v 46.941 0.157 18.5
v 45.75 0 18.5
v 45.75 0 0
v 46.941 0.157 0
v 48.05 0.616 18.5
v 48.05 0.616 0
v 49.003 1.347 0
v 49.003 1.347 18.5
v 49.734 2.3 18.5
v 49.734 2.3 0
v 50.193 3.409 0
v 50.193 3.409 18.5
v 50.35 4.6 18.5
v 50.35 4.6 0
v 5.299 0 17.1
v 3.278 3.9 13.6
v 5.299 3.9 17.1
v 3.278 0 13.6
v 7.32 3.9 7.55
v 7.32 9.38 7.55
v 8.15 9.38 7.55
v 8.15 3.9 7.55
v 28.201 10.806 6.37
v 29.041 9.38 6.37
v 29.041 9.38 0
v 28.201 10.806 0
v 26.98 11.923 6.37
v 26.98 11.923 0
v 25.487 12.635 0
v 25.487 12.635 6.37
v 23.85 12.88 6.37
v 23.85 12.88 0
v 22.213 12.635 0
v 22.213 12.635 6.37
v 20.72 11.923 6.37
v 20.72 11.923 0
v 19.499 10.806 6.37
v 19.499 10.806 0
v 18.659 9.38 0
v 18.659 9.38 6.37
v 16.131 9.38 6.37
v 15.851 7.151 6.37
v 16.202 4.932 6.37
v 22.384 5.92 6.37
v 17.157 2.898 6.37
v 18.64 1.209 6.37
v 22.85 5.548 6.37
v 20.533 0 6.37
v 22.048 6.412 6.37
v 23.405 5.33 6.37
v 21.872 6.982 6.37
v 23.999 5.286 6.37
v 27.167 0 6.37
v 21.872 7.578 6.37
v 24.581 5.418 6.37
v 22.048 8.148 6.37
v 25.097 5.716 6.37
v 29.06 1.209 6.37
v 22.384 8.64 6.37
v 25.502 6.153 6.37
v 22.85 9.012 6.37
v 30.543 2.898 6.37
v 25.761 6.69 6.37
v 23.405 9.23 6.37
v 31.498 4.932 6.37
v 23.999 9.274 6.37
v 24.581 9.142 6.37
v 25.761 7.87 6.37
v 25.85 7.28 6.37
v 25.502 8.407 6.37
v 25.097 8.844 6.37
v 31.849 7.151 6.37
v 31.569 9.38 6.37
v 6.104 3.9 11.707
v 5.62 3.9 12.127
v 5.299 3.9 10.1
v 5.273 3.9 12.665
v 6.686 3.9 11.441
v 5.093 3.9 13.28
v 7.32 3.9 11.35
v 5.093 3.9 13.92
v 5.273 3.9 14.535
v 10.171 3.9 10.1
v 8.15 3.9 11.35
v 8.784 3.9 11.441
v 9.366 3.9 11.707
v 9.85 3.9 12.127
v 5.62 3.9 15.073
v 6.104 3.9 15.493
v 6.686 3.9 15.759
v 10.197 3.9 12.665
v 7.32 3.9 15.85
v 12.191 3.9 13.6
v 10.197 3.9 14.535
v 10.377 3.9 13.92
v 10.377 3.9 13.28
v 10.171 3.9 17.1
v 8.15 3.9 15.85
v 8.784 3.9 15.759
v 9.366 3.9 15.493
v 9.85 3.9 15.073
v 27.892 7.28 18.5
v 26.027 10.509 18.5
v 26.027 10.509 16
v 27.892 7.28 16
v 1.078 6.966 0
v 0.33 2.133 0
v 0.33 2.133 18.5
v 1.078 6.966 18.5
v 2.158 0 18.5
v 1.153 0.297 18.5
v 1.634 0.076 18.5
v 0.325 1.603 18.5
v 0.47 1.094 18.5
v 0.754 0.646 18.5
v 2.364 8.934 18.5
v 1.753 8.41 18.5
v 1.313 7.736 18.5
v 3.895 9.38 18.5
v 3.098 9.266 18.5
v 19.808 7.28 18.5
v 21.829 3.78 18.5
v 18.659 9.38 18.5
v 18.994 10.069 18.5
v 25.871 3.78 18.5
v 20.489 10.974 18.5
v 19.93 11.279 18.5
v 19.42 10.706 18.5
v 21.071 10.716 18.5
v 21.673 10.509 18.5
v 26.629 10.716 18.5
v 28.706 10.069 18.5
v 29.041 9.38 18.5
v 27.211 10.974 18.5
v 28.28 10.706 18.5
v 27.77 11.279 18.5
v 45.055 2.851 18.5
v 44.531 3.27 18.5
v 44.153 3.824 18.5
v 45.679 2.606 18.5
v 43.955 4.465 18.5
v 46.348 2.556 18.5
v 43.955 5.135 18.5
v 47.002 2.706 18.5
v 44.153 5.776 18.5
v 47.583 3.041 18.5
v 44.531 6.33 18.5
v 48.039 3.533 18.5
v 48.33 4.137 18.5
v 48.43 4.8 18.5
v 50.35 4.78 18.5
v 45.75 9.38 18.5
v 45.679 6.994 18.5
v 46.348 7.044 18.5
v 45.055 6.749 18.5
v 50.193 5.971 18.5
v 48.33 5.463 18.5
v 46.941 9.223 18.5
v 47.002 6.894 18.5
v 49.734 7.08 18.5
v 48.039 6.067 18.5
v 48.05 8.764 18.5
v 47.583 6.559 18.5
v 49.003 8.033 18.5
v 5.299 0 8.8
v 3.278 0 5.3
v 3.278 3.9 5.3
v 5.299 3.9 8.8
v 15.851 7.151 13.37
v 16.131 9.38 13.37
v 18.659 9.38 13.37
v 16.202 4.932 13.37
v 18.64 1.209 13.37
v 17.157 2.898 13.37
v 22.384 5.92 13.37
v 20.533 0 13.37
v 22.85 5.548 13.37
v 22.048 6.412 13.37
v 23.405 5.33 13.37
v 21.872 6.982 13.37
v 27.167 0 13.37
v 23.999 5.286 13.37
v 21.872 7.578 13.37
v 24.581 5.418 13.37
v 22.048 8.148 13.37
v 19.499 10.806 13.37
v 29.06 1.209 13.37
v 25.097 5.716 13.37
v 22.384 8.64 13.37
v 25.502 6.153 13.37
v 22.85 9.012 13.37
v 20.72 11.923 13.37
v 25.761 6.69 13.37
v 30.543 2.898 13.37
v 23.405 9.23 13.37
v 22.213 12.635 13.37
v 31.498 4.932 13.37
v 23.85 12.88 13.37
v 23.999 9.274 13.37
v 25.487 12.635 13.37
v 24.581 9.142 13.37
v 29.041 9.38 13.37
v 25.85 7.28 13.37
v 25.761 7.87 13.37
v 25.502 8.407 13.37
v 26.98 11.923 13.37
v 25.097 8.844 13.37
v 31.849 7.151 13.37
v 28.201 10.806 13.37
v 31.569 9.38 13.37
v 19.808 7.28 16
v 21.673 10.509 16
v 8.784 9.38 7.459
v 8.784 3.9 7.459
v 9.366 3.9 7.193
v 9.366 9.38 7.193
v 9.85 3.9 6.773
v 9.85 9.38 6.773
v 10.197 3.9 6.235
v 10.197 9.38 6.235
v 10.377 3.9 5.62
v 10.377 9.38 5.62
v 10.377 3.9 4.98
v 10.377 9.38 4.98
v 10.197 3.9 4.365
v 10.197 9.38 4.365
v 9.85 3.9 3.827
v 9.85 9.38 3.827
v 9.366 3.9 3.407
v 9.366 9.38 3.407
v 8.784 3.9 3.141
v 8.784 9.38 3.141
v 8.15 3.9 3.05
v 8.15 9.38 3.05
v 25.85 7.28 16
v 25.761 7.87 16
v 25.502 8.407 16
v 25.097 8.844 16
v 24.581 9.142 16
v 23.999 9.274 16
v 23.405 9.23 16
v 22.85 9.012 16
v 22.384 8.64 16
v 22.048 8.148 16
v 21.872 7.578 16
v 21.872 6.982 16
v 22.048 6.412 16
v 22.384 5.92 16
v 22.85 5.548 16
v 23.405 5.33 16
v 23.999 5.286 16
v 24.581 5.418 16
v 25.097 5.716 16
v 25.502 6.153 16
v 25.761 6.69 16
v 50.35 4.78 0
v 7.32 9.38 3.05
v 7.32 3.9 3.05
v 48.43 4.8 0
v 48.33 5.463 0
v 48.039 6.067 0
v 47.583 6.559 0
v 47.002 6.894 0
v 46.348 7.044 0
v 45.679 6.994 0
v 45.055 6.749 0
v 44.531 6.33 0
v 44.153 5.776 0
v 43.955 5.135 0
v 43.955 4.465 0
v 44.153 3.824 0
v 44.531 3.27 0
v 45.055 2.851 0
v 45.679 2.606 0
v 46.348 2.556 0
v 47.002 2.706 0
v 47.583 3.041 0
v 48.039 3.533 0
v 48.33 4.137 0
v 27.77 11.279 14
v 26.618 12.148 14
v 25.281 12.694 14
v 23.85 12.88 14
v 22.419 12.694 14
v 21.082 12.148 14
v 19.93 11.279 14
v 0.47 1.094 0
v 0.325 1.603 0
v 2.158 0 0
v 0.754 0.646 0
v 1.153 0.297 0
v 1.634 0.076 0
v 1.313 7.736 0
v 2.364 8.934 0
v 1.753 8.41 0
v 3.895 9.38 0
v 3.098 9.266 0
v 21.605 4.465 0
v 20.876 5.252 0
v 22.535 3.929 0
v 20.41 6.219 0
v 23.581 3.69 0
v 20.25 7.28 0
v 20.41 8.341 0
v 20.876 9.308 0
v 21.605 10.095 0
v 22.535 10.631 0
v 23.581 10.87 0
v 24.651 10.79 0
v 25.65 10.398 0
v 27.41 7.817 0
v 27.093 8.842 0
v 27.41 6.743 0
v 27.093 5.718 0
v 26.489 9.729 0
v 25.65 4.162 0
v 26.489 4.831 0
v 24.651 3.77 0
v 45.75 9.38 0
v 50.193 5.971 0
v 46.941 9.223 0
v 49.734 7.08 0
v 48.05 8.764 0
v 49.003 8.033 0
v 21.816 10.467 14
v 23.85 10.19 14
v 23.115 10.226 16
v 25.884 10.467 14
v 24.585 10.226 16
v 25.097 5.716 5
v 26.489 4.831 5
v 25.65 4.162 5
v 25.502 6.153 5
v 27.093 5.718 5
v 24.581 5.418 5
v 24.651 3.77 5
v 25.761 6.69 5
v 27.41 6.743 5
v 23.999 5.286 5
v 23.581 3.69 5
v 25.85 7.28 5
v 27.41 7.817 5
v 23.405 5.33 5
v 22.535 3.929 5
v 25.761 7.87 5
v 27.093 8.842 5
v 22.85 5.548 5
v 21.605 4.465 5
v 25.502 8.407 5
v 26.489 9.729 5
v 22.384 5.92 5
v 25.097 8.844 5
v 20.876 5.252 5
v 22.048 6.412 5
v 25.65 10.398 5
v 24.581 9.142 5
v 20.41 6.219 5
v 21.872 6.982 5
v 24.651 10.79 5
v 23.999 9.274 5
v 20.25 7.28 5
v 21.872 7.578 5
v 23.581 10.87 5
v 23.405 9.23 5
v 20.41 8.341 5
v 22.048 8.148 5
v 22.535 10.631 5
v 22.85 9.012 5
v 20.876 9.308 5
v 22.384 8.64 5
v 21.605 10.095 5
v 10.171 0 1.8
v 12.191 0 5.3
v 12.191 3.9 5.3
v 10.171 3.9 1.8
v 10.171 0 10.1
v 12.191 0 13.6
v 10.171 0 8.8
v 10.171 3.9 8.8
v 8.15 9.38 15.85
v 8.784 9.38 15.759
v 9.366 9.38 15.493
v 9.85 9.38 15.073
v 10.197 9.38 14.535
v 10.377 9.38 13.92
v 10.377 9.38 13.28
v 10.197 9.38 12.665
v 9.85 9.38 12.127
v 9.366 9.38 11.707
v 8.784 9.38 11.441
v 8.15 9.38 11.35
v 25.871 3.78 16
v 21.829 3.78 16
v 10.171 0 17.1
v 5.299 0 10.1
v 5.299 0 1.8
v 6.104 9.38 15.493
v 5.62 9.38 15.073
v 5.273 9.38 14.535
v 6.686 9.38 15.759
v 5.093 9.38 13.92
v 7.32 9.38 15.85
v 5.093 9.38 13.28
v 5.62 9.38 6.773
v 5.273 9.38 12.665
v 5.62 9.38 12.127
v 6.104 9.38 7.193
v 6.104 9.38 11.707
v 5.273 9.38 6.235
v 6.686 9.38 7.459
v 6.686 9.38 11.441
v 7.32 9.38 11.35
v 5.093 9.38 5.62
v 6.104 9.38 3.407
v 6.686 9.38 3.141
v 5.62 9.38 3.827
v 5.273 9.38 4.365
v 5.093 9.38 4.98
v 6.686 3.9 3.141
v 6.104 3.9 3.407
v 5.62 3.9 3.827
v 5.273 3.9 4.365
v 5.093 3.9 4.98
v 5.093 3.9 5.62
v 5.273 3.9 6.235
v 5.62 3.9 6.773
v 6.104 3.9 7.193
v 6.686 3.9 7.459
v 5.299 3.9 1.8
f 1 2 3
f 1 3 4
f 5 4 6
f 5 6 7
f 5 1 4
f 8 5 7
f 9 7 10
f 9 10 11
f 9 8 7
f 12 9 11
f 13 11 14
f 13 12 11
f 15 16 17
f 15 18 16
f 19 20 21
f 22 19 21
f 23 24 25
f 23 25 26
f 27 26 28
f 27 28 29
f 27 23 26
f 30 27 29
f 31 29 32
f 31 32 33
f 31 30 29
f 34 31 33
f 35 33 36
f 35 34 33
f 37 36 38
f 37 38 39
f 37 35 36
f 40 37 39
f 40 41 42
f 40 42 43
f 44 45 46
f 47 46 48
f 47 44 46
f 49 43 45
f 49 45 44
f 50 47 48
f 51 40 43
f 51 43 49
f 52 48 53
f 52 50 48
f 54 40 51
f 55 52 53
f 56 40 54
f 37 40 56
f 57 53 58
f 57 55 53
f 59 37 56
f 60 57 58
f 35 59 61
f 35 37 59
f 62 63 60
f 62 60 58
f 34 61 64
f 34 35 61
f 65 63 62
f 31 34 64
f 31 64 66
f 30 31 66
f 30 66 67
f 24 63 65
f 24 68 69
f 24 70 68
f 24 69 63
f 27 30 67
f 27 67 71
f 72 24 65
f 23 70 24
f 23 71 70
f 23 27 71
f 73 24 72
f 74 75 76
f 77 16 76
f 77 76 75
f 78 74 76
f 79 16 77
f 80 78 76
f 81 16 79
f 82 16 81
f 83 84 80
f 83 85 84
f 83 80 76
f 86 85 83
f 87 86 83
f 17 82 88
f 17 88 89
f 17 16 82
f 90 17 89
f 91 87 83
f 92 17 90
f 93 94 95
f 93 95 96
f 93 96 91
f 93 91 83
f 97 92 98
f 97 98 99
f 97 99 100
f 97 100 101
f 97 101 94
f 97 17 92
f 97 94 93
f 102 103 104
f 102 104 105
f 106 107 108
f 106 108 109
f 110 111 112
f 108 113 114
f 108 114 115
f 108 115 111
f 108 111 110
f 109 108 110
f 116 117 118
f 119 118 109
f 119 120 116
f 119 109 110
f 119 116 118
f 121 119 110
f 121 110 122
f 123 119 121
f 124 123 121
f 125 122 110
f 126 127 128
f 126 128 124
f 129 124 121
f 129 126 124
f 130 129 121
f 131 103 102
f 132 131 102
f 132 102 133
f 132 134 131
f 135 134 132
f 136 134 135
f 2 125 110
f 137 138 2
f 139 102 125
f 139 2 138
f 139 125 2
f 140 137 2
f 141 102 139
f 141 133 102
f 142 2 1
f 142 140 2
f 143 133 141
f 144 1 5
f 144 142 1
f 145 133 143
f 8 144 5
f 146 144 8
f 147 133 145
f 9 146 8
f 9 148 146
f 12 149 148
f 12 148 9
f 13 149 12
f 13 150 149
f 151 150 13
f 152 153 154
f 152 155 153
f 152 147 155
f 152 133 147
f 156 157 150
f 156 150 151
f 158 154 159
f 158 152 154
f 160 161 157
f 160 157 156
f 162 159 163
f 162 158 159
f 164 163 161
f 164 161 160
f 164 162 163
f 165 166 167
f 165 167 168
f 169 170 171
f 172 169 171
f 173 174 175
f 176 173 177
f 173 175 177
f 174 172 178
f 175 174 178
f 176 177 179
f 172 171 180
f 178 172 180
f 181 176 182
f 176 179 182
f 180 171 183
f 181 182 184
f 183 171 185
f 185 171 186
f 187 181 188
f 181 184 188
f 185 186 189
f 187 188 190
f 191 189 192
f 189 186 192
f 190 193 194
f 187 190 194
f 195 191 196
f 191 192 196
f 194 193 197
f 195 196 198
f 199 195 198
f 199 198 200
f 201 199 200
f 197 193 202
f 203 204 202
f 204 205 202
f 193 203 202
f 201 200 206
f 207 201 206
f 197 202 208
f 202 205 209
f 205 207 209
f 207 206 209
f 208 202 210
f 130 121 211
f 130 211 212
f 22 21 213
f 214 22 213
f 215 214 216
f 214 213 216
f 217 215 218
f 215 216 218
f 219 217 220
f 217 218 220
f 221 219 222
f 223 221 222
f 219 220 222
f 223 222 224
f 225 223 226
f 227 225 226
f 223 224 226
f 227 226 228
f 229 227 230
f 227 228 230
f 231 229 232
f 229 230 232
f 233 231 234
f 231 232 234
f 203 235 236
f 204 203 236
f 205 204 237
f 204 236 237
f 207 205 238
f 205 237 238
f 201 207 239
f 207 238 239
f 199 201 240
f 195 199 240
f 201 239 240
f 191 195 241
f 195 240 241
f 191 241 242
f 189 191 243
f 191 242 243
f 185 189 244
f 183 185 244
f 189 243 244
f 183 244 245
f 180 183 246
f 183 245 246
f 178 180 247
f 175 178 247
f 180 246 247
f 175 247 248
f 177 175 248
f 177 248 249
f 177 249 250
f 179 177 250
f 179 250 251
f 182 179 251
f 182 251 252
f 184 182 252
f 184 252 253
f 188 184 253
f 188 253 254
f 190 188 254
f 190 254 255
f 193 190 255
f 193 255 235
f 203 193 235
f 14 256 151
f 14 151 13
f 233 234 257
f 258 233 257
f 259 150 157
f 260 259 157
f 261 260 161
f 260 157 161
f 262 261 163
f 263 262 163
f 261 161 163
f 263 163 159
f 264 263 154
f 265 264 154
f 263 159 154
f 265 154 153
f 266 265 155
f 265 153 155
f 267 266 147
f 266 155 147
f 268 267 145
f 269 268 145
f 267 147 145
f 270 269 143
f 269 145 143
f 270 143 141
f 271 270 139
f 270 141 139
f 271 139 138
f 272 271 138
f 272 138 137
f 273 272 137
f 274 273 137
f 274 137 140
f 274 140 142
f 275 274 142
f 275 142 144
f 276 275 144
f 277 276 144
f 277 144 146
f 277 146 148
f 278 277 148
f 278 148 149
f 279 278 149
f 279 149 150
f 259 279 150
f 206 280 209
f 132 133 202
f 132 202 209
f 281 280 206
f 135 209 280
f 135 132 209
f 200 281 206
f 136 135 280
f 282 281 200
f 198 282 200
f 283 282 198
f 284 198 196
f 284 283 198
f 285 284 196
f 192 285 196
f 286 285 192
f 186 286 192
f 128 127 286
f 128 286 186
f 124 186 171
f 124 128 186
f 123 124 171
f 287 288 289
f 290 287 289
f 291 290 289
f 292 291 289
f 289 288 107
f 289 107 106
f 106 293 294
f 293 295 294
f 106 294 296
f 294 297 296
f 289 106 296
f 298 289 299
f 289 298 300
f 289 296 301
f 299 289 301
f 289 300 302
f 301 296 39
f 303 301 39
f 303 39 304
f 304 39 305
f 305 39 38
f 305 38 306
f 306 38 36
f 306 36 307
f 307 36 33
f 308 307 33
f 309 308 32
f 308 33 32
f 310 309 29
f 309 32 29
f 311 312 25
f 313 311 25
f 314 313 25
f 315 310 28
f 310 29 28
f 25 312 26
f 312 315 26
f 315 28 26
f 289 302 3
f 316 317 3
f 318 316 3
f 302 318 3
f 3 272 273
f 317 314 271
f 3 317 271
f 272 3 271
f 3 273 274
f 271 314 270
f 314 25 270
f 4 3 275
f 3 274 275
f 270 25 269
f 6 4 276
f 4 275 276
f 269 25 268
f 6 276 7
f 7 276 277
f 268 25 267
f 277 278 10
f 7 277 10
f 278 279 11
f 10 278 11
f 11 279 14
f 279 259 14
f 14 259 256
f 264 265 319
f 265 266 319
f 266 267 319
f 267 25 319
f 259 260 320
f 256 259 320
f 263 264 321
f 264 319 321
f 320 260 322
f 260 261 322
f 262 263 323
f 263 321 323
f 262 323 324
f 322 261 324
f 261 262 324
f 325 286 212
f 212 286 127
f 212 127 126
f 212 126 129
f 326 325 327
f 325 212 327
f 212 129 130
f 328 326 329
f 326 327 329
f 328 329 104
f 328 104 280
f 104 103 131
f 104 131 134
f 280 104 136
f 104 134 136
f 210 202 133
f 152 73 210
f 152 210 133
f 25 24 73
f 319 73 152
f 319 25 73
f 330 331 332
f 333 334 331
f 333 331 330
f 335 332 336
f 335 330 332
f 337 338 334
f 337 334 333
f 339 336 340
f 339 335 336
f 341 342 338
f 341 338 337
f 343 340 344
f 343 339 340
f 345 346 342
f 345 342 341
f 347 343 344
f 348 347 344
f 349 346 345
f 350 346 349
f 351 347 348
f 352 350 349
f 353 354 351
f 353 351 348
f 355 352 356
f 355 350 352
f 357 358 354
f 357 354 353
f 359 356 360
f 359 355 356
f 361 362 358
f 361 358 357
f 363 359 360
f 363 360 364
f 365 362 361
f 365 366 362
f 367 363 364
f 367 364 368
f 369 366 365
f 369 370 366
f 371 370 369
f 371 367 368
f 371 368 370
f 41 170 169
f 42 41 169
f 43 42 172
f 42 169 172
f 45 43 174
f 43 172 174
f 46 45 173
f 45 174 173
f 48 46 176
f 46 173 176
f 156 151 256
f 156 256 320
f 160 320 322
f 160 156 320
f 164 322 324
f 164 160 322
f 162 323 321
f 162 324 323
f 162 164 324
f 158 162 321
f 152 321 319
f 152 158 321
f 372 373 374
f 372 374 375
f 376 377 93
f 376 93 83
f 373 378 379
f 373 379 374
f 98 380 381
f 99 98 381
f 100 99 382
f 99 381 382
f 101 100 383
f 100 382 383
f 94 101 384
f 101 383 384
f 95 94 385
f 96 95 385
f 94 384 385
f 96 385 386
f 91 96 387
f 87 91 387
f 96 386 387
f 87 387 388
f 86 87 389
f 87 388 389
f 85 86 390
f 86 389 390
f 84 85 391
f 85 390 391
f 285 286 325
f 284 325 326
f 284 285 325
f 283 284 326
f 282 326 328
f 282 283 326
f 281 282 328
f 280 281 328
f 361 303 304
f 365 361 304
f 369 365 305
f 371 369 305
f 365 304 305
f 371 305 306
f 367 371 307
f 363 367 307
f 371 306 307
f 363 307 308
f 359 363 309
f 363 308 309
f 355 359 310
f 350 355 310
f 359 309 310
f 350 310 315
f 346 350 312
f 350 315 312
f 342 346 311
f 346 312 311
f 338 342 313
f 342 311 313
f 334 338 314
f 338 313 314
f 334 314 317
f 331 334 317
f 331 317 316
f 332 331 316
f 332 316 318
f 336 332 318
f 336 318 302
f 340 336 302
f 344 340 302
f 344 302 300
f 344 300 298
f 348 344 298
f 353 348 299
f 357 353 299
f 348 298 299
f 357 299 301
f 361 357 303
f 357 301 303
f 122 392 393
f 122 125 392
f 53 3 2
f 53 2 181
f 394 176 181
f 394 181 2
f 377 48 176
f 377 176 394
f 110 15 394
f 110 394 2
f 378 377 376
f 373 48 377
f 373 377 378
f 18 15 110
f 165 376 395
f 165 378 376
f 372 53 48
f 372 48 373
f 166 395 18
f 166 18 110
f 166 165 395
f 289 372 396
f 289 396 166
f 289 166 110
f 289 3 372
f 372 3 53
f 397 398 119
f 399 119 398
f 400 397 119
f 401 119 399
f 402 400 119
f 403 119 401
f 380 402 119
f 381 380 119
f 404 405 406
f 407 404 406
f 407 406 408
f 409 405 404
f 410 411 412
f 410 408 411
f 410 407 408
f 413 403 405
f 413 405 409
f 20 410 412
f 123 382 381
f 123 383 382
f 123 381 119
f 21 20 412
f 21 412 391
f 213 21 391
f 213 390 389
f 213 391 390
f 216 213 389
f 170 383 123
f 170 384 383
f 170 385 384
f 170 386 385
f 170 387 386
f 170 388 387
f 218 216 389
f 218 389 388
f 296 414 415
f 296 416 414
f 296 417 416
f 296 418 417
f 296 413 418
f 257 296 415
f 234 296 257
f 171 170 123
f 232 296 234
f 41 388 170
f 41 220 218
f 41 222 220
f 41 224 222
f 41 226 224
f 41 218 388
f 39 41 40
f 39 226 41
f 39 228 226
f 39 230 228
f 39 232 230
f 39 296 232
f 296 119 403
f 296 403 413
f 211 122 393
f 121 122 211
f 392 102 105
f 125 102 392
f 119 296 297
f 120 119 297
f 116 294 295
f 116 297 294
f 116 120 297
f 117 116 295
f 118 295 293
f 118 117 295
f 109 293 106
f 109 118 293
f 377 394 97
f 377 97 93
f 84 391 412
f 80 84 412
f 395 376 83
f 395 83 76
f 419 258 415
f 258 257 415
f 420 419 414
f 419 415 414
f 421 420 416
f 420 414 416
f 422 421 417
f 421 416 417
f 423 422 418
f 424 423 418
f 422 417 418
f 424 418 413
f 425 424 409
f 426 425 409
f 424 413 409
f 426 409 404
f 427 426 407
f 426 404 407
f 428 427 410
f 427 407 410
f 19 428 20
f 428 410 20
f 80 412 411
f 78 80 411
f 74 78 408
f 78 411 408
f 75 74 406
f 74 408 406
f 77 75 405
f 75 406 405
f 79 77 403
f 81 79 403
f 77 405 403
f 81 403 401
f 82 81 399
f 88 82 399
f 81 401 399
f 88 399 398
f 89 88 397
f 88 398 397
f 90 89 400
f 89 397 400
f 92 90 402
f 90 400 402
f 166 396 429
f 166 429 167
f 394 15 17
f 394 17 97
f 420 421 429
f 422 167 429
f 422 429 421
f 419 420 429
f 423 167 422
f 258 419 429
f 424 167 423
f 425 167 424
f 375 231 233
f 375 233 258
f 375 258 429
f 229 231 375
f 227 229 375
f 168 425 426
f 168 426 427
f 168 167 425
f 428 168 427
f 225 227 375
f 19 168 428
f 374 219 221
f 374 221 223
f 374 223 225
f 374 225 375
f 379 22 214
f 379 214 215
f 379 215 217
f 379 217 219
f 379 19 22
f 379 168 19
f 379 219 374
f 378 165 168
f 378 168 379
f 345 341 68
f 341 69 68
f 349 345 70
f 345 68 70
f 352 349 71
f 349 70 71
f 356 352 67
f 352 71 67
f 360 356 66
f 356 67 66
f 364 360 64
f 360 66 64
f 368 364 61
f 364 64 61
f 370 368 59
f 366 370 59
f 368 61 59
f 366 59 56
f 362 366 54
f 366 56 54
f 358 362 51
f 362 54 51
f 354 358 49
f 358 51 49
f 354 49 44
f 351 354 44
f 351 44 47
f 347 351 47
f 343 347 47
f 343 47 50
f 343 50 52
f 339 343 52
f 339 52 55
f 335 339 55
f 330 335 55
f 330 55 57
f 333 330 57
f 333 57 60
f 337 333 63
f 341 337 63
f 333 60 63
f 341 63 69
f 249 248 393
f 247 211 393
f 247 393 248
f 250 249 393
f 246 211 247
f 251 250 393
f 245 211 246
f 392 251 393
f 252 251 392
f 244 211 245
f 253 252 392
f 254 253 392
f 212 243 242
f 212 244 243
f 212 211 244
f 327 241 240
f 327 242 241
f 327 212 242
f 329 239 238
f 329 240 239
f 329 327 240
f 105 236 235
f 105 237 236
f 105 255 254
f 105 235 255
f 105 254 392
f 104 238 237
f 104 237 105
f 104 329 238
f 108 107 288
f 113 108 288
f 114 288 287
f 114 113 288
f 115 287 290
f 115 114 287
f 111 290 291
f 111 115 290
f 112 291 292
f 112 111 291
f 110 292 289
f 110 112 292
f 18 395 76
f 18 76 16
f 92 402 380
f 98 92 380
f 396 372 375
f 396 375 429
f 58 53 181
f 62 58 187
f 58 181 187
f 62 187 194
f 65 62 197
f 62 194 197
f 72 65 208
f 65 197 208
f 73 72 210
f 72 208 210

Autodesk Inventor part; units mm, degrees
ref_plane "YZ Plane" through (0, 0, 0) normal (1, 0, 0) x (0, 1, 0)
ref_plane "XZ Plane" through (0, 0, 0) normal (0, 1, 0) x (-1, 0, 0)
sketch "Sketch1" plane through (0, 0, 0) normal (0, 0, 1) x (1, 0, 0)
  line L0 (0, 0) -> (1.4521, 9.38)
  line L1 (1.4521, 9.38) -> (50.35, 9.38)
  line L2 (50.35, 9.38) -> (50.35, 0)
  line L3 (50.35, 0) -> (0, 0)
  dimension "d7" = 81.2
  dimension "d8" = 50.35
  dimension "d9" = 9.38
extrude "Extrusion1" add sketch "Sketch1" along normal blind 18.5
fillet "Fillet1" radius 2.85 1 edges at (1.4521, 9.38, 9.25)
fillet "Fillet2" radius 1.85 1 edges at (0, 0, 9.25)
sketch "Sketch3" plane through (0, 0, 18.5) normal (0, 0, 1) x (1, 0, 0)
  line L0 (2.1584, 0) -> (50.35, 0) projected
  line L1 (50.35, 0) -> (50.35, 9.38) projected
  circle A0 centre (46.18, 4.8) radius 2.25
  point P0 (0, 0)
  dimension "d13" = 4.5
  dimension "d14" = 4.8
  dimension "d15" = 4.17
extrude "Extrusion2" cut sketch "Sketch3" against normal up to next
fillet "Fillet3" radius 4.6 2 edges at (50.35, 9.38, 9.25) (50.35, 0, 9.25)
sketch "Sketch5" plane through (0, 0, 18.5) normal (0, 0, 1) x (1, 0, 0)
  line L0 (45.75, 9.38) -> (3.8948, 9.38) projected
  arc A0 (29.0413, 9.38) -> (18.6587, 9.38) centre (23.85, 7.28) ccw
  point P0 (50.35, 4.6)
  point P1 (0, 0)
  dimension "d24" = 11.2
  dimension "d25" = 2.1
  dimension "d26" = 26.5
extrude "Extrusion4" add sketch "Sketch5" against normal up to surface (18.5 mm away)
sketch "Sketch6" plane through (0, 0, 18.5) normal (0, 0, 1) x (1, 0, 0)
  arc A0 (29.0413, 9.38) -> (18.6587, 9.38) centre (23.85, 7.28) ccw projected
  line L0 (27.8915, 7.28) -> (25.8707, 3.78)
  line L1 (25.8707, 3.78) -> (21.8293, 3.78)
  line L2 (21.8293, 3.78) -> (19.8085, 7.28)
  line L3 (19.8085, 7.28) -> (21.8293, 10.78)
  line L4 (21.8293, 10.78) -> (25.8707, 10.78)
  line L5 (25.8707, 10.78) -> (27.8915, 7.28)
  point P0 (0, 0)
  dimension "d29" = 7
extrude "Extrusion5" cut sketch "Sketch6" against normal blind 2.5
sketch "Sketch7" plane through (0, 0, 18.5) normal (0, 0, 1) x (1, 0, 0)
  arc A0 (29.0413, 9.38) -> (18.6587, 9.38) centre (23.85, 7.28) ccw projected
  circle A1 centre (23.85, 7.28) radius 2
  point P0 (0, 0)
  dimension "d32" = 4
extrude "Extrusion6" cut sketch "Sketch7" against normal up to surface (18.5 mm away)
ref_plane "Work Plane1" through (0, 0, 13.37) normal (0, 0, 1) x (1, 0, 0)
sketch "Sketch8" plane through (0, 0, 13.37) normal (0, 0, 1) x (1, 0, 0)
  circle A0 centre (23.85, 7.28) radius 2 projected
  circle A1 centre (23.85, 7.28) radius 8
  point P0 (0, 0)
  dimension "d36" = 16
extrude "Extrusion7" cut sketch "Sketch8" against normal blind 7
sketch "Sketch9" plane through (0, 0, 18.5) normal (0, 0, 1) x (1, 0, 0)
  line L0 (45.75, 9.38) -> (29.0413, 9.38) projected
  arc A0 (29.0413, 9.38) -> (18.6587, 9.38) centre (23.85, 7.28) ccw projected
  circle A1 centre (23.85, 17.79) radius 7.6
  point P0 (0, 0)
  dimension "d39" = 15.2
  dimension "d40" = 8.41
extrude "Extrusion8" cut sketch "Sketch9" against normal blind 4.5
sketch "Sketch10" plane through (0, 0, 0) normal (0, 0, -1) x (-1, 0, 0)
  circle A0 centre (-23.85, 7.28) radius 2 projected
  arc A1 (-18.6587, 9.38) -> (-29.0413, 9.38) centre (-23.85, 7.28) ccw projected
  circle A2 centre (-23.85, 7.28) radius 3.6
  point P0 (0, 0)
  dimension "d43" = 7.2
extrude "Extrusion9" cut sketch "Sketch10" against normal blind 5
sketch "Sketch11" plane through (3.8948, 9.38, 18.5) normal (0, 1, 0) x (1, 0, 0)
  line L0 (0, 18.5) -> (14.7638, 18.5) projected
  line L1 (14.7638, 0) -> (0, 0) projected
  line L2 (3.4252, 13.2) -> (4.2552, 13.2) construction
  line L3 (3.4252, 10.95) -> (4.2552, 10.95)
  line L4 (4.2552, 15.45) -> (3.4252, 15.45)
  arc A0 (3.4252, 15.45) -> (3.4252, 10.95) centre (3.4252, 13.2) ccw
  arc A1 (4.2552, 10.95) -> (4.2552, 15.45) centre (4.2552, 13.2) ccw
  line L5 (3.4252, 4.9) -> (4.2552, 4.9) construction
  line L6 (3.4252, 2.65) -> (4.2552, 2.65)
  line L7 (4.2552, 7.15) -> (3.4252, 7.15)
  arc A2 (3.4252, 7.15) -> (3.4252, 2.65) centre (3.4252, 4.9) ccw
  arc A3 (4.2552, 2.65) -> (4.2552, 7.15) centre (4.2552, 4.9) ccw
  line L8 (46.4552, 0) -> (46.4552, 18.5) projected
  point P0 (-3.8948, 18.5)
  point P1 (3.8402, 13.2)
  point P2 (3.8402, 4.9)
  dimension "d46" = 4.5
  dimension "d47" = 0.83
  dimension "d48" = 4.9
  dimension "d49" = 5.3
  dimension "d50" = 42.2
extrude "Extrusion10" cut sketch "Sketch11" against normal up to next
sketch "Sketch12" plane through (2.1584, 0, 0) normal (0, -1, 0) x (1, 0, 0)
  arc A0 (5.9916, 3.05) -> (5.9916, 7.55) centre (5.9916, 5.3) ccw projected
  line L0 (5.9916, 3.05) -> (5.1616, 3.05) projected
  arc A1 (5.1616, 7.55) -> (5.1616, 3.05) centre (5.1616, 5.3) ccw projected
  line L1 (5.1616, 7.55) -> (5.9916, 7.55) projected
  arc A2 (5.9916, 11.35) -> (5.9916, 15.85) centre (5.9916, 13.6) ccw projected
  line L2 (5.9916, 11.35) -> (5.1616, 11.35) projected
  arc A3 (5.1616, 15.85) -> (5.1616, 11.35) centre (5.1616, 13.6) ccw projected
  line L3 (5.1616, 15.85) -> (5.9916, 15.85) projected
  line L4 (10.033, 13.6) -> (8.0123, 10.1)
  line L5 (8.0123, 10.1) -> (3.9708, 10.1)
  line L6 (3.9708, 10.1) -> (1.9501, 13.6)
  line L7 (1.9501, 13.6) -> (3.9708, 17.1)
  line L8 (3.9708, 17.1) -> (8.0123, 17.1)
  line L9 (8.0123, 17.1) -> (10.033, 13.6)
  line L10 (1.1201, 13.6) -> (3.1408, 17.1)
  line L11 (3.1408, 17.1) -> (7.1823, 17.1)
  line L12 (7.1823, 17.1) -> (9.203, 13.6)
  line L13 (9.203, 13.6) -> (7.1823, 10.1)
  line L14 (7.1823, 10.1) -> (3.1408, 10.1)
  line L15 (3.1408, 10.1) -> (1.1201, 13.6)
  line L16 (10.033, 5.3) -> (8.0123, 1.8)
  line L17 (8.0123, 1.8) -> (3.9708, 1.8)
  line L18 (3.9708, 1.8) -> (1.9501, 5.3)
  line L19 (1.9501, 5.3) -> (3.9708, 8.8)
  line L20 (3.9708, 8.8) -> (8.0123, 8.8)
  line L21 (8.0123, 8.8) -> (10.033, 5.3)
  line L22 (1.1201, 5.3) -> (3.1408, 8.8)
  line L23 (3.1408, 8.8) -> (7.1823, 8.8)
  line L24 (7.1823, 8.8) -> (9.203, 5.3)
  line L25 (9.203, 5.3) -> (7.1823, 1.8)
  line L26 (7.1823, 1.8) -> (3.1408, 1.8)
  line L27 (3.1408, 1.8) -> (1.1201, 5.3)
  point P0 (-2.1584, 0)
  dimension "d53" = 7
extrude "Extrusion11" cut sketch "Sketch12" against normal blind 3.9 contours L0 A1 L1 A0 | L2 A3 L3 A2 | L4 L5 L13 L12 L8 L9 | L5 L6 L7 L8 L12 L13 | L14 L15 L10 L11 L7 L6 | L16 L17 L25 L24 L20 L21 | L17 L18 L19 L20 L24 L25 | L26 L27 L22 L23 L19 L18
properties part number "FelixOriginalBearingHolder"
